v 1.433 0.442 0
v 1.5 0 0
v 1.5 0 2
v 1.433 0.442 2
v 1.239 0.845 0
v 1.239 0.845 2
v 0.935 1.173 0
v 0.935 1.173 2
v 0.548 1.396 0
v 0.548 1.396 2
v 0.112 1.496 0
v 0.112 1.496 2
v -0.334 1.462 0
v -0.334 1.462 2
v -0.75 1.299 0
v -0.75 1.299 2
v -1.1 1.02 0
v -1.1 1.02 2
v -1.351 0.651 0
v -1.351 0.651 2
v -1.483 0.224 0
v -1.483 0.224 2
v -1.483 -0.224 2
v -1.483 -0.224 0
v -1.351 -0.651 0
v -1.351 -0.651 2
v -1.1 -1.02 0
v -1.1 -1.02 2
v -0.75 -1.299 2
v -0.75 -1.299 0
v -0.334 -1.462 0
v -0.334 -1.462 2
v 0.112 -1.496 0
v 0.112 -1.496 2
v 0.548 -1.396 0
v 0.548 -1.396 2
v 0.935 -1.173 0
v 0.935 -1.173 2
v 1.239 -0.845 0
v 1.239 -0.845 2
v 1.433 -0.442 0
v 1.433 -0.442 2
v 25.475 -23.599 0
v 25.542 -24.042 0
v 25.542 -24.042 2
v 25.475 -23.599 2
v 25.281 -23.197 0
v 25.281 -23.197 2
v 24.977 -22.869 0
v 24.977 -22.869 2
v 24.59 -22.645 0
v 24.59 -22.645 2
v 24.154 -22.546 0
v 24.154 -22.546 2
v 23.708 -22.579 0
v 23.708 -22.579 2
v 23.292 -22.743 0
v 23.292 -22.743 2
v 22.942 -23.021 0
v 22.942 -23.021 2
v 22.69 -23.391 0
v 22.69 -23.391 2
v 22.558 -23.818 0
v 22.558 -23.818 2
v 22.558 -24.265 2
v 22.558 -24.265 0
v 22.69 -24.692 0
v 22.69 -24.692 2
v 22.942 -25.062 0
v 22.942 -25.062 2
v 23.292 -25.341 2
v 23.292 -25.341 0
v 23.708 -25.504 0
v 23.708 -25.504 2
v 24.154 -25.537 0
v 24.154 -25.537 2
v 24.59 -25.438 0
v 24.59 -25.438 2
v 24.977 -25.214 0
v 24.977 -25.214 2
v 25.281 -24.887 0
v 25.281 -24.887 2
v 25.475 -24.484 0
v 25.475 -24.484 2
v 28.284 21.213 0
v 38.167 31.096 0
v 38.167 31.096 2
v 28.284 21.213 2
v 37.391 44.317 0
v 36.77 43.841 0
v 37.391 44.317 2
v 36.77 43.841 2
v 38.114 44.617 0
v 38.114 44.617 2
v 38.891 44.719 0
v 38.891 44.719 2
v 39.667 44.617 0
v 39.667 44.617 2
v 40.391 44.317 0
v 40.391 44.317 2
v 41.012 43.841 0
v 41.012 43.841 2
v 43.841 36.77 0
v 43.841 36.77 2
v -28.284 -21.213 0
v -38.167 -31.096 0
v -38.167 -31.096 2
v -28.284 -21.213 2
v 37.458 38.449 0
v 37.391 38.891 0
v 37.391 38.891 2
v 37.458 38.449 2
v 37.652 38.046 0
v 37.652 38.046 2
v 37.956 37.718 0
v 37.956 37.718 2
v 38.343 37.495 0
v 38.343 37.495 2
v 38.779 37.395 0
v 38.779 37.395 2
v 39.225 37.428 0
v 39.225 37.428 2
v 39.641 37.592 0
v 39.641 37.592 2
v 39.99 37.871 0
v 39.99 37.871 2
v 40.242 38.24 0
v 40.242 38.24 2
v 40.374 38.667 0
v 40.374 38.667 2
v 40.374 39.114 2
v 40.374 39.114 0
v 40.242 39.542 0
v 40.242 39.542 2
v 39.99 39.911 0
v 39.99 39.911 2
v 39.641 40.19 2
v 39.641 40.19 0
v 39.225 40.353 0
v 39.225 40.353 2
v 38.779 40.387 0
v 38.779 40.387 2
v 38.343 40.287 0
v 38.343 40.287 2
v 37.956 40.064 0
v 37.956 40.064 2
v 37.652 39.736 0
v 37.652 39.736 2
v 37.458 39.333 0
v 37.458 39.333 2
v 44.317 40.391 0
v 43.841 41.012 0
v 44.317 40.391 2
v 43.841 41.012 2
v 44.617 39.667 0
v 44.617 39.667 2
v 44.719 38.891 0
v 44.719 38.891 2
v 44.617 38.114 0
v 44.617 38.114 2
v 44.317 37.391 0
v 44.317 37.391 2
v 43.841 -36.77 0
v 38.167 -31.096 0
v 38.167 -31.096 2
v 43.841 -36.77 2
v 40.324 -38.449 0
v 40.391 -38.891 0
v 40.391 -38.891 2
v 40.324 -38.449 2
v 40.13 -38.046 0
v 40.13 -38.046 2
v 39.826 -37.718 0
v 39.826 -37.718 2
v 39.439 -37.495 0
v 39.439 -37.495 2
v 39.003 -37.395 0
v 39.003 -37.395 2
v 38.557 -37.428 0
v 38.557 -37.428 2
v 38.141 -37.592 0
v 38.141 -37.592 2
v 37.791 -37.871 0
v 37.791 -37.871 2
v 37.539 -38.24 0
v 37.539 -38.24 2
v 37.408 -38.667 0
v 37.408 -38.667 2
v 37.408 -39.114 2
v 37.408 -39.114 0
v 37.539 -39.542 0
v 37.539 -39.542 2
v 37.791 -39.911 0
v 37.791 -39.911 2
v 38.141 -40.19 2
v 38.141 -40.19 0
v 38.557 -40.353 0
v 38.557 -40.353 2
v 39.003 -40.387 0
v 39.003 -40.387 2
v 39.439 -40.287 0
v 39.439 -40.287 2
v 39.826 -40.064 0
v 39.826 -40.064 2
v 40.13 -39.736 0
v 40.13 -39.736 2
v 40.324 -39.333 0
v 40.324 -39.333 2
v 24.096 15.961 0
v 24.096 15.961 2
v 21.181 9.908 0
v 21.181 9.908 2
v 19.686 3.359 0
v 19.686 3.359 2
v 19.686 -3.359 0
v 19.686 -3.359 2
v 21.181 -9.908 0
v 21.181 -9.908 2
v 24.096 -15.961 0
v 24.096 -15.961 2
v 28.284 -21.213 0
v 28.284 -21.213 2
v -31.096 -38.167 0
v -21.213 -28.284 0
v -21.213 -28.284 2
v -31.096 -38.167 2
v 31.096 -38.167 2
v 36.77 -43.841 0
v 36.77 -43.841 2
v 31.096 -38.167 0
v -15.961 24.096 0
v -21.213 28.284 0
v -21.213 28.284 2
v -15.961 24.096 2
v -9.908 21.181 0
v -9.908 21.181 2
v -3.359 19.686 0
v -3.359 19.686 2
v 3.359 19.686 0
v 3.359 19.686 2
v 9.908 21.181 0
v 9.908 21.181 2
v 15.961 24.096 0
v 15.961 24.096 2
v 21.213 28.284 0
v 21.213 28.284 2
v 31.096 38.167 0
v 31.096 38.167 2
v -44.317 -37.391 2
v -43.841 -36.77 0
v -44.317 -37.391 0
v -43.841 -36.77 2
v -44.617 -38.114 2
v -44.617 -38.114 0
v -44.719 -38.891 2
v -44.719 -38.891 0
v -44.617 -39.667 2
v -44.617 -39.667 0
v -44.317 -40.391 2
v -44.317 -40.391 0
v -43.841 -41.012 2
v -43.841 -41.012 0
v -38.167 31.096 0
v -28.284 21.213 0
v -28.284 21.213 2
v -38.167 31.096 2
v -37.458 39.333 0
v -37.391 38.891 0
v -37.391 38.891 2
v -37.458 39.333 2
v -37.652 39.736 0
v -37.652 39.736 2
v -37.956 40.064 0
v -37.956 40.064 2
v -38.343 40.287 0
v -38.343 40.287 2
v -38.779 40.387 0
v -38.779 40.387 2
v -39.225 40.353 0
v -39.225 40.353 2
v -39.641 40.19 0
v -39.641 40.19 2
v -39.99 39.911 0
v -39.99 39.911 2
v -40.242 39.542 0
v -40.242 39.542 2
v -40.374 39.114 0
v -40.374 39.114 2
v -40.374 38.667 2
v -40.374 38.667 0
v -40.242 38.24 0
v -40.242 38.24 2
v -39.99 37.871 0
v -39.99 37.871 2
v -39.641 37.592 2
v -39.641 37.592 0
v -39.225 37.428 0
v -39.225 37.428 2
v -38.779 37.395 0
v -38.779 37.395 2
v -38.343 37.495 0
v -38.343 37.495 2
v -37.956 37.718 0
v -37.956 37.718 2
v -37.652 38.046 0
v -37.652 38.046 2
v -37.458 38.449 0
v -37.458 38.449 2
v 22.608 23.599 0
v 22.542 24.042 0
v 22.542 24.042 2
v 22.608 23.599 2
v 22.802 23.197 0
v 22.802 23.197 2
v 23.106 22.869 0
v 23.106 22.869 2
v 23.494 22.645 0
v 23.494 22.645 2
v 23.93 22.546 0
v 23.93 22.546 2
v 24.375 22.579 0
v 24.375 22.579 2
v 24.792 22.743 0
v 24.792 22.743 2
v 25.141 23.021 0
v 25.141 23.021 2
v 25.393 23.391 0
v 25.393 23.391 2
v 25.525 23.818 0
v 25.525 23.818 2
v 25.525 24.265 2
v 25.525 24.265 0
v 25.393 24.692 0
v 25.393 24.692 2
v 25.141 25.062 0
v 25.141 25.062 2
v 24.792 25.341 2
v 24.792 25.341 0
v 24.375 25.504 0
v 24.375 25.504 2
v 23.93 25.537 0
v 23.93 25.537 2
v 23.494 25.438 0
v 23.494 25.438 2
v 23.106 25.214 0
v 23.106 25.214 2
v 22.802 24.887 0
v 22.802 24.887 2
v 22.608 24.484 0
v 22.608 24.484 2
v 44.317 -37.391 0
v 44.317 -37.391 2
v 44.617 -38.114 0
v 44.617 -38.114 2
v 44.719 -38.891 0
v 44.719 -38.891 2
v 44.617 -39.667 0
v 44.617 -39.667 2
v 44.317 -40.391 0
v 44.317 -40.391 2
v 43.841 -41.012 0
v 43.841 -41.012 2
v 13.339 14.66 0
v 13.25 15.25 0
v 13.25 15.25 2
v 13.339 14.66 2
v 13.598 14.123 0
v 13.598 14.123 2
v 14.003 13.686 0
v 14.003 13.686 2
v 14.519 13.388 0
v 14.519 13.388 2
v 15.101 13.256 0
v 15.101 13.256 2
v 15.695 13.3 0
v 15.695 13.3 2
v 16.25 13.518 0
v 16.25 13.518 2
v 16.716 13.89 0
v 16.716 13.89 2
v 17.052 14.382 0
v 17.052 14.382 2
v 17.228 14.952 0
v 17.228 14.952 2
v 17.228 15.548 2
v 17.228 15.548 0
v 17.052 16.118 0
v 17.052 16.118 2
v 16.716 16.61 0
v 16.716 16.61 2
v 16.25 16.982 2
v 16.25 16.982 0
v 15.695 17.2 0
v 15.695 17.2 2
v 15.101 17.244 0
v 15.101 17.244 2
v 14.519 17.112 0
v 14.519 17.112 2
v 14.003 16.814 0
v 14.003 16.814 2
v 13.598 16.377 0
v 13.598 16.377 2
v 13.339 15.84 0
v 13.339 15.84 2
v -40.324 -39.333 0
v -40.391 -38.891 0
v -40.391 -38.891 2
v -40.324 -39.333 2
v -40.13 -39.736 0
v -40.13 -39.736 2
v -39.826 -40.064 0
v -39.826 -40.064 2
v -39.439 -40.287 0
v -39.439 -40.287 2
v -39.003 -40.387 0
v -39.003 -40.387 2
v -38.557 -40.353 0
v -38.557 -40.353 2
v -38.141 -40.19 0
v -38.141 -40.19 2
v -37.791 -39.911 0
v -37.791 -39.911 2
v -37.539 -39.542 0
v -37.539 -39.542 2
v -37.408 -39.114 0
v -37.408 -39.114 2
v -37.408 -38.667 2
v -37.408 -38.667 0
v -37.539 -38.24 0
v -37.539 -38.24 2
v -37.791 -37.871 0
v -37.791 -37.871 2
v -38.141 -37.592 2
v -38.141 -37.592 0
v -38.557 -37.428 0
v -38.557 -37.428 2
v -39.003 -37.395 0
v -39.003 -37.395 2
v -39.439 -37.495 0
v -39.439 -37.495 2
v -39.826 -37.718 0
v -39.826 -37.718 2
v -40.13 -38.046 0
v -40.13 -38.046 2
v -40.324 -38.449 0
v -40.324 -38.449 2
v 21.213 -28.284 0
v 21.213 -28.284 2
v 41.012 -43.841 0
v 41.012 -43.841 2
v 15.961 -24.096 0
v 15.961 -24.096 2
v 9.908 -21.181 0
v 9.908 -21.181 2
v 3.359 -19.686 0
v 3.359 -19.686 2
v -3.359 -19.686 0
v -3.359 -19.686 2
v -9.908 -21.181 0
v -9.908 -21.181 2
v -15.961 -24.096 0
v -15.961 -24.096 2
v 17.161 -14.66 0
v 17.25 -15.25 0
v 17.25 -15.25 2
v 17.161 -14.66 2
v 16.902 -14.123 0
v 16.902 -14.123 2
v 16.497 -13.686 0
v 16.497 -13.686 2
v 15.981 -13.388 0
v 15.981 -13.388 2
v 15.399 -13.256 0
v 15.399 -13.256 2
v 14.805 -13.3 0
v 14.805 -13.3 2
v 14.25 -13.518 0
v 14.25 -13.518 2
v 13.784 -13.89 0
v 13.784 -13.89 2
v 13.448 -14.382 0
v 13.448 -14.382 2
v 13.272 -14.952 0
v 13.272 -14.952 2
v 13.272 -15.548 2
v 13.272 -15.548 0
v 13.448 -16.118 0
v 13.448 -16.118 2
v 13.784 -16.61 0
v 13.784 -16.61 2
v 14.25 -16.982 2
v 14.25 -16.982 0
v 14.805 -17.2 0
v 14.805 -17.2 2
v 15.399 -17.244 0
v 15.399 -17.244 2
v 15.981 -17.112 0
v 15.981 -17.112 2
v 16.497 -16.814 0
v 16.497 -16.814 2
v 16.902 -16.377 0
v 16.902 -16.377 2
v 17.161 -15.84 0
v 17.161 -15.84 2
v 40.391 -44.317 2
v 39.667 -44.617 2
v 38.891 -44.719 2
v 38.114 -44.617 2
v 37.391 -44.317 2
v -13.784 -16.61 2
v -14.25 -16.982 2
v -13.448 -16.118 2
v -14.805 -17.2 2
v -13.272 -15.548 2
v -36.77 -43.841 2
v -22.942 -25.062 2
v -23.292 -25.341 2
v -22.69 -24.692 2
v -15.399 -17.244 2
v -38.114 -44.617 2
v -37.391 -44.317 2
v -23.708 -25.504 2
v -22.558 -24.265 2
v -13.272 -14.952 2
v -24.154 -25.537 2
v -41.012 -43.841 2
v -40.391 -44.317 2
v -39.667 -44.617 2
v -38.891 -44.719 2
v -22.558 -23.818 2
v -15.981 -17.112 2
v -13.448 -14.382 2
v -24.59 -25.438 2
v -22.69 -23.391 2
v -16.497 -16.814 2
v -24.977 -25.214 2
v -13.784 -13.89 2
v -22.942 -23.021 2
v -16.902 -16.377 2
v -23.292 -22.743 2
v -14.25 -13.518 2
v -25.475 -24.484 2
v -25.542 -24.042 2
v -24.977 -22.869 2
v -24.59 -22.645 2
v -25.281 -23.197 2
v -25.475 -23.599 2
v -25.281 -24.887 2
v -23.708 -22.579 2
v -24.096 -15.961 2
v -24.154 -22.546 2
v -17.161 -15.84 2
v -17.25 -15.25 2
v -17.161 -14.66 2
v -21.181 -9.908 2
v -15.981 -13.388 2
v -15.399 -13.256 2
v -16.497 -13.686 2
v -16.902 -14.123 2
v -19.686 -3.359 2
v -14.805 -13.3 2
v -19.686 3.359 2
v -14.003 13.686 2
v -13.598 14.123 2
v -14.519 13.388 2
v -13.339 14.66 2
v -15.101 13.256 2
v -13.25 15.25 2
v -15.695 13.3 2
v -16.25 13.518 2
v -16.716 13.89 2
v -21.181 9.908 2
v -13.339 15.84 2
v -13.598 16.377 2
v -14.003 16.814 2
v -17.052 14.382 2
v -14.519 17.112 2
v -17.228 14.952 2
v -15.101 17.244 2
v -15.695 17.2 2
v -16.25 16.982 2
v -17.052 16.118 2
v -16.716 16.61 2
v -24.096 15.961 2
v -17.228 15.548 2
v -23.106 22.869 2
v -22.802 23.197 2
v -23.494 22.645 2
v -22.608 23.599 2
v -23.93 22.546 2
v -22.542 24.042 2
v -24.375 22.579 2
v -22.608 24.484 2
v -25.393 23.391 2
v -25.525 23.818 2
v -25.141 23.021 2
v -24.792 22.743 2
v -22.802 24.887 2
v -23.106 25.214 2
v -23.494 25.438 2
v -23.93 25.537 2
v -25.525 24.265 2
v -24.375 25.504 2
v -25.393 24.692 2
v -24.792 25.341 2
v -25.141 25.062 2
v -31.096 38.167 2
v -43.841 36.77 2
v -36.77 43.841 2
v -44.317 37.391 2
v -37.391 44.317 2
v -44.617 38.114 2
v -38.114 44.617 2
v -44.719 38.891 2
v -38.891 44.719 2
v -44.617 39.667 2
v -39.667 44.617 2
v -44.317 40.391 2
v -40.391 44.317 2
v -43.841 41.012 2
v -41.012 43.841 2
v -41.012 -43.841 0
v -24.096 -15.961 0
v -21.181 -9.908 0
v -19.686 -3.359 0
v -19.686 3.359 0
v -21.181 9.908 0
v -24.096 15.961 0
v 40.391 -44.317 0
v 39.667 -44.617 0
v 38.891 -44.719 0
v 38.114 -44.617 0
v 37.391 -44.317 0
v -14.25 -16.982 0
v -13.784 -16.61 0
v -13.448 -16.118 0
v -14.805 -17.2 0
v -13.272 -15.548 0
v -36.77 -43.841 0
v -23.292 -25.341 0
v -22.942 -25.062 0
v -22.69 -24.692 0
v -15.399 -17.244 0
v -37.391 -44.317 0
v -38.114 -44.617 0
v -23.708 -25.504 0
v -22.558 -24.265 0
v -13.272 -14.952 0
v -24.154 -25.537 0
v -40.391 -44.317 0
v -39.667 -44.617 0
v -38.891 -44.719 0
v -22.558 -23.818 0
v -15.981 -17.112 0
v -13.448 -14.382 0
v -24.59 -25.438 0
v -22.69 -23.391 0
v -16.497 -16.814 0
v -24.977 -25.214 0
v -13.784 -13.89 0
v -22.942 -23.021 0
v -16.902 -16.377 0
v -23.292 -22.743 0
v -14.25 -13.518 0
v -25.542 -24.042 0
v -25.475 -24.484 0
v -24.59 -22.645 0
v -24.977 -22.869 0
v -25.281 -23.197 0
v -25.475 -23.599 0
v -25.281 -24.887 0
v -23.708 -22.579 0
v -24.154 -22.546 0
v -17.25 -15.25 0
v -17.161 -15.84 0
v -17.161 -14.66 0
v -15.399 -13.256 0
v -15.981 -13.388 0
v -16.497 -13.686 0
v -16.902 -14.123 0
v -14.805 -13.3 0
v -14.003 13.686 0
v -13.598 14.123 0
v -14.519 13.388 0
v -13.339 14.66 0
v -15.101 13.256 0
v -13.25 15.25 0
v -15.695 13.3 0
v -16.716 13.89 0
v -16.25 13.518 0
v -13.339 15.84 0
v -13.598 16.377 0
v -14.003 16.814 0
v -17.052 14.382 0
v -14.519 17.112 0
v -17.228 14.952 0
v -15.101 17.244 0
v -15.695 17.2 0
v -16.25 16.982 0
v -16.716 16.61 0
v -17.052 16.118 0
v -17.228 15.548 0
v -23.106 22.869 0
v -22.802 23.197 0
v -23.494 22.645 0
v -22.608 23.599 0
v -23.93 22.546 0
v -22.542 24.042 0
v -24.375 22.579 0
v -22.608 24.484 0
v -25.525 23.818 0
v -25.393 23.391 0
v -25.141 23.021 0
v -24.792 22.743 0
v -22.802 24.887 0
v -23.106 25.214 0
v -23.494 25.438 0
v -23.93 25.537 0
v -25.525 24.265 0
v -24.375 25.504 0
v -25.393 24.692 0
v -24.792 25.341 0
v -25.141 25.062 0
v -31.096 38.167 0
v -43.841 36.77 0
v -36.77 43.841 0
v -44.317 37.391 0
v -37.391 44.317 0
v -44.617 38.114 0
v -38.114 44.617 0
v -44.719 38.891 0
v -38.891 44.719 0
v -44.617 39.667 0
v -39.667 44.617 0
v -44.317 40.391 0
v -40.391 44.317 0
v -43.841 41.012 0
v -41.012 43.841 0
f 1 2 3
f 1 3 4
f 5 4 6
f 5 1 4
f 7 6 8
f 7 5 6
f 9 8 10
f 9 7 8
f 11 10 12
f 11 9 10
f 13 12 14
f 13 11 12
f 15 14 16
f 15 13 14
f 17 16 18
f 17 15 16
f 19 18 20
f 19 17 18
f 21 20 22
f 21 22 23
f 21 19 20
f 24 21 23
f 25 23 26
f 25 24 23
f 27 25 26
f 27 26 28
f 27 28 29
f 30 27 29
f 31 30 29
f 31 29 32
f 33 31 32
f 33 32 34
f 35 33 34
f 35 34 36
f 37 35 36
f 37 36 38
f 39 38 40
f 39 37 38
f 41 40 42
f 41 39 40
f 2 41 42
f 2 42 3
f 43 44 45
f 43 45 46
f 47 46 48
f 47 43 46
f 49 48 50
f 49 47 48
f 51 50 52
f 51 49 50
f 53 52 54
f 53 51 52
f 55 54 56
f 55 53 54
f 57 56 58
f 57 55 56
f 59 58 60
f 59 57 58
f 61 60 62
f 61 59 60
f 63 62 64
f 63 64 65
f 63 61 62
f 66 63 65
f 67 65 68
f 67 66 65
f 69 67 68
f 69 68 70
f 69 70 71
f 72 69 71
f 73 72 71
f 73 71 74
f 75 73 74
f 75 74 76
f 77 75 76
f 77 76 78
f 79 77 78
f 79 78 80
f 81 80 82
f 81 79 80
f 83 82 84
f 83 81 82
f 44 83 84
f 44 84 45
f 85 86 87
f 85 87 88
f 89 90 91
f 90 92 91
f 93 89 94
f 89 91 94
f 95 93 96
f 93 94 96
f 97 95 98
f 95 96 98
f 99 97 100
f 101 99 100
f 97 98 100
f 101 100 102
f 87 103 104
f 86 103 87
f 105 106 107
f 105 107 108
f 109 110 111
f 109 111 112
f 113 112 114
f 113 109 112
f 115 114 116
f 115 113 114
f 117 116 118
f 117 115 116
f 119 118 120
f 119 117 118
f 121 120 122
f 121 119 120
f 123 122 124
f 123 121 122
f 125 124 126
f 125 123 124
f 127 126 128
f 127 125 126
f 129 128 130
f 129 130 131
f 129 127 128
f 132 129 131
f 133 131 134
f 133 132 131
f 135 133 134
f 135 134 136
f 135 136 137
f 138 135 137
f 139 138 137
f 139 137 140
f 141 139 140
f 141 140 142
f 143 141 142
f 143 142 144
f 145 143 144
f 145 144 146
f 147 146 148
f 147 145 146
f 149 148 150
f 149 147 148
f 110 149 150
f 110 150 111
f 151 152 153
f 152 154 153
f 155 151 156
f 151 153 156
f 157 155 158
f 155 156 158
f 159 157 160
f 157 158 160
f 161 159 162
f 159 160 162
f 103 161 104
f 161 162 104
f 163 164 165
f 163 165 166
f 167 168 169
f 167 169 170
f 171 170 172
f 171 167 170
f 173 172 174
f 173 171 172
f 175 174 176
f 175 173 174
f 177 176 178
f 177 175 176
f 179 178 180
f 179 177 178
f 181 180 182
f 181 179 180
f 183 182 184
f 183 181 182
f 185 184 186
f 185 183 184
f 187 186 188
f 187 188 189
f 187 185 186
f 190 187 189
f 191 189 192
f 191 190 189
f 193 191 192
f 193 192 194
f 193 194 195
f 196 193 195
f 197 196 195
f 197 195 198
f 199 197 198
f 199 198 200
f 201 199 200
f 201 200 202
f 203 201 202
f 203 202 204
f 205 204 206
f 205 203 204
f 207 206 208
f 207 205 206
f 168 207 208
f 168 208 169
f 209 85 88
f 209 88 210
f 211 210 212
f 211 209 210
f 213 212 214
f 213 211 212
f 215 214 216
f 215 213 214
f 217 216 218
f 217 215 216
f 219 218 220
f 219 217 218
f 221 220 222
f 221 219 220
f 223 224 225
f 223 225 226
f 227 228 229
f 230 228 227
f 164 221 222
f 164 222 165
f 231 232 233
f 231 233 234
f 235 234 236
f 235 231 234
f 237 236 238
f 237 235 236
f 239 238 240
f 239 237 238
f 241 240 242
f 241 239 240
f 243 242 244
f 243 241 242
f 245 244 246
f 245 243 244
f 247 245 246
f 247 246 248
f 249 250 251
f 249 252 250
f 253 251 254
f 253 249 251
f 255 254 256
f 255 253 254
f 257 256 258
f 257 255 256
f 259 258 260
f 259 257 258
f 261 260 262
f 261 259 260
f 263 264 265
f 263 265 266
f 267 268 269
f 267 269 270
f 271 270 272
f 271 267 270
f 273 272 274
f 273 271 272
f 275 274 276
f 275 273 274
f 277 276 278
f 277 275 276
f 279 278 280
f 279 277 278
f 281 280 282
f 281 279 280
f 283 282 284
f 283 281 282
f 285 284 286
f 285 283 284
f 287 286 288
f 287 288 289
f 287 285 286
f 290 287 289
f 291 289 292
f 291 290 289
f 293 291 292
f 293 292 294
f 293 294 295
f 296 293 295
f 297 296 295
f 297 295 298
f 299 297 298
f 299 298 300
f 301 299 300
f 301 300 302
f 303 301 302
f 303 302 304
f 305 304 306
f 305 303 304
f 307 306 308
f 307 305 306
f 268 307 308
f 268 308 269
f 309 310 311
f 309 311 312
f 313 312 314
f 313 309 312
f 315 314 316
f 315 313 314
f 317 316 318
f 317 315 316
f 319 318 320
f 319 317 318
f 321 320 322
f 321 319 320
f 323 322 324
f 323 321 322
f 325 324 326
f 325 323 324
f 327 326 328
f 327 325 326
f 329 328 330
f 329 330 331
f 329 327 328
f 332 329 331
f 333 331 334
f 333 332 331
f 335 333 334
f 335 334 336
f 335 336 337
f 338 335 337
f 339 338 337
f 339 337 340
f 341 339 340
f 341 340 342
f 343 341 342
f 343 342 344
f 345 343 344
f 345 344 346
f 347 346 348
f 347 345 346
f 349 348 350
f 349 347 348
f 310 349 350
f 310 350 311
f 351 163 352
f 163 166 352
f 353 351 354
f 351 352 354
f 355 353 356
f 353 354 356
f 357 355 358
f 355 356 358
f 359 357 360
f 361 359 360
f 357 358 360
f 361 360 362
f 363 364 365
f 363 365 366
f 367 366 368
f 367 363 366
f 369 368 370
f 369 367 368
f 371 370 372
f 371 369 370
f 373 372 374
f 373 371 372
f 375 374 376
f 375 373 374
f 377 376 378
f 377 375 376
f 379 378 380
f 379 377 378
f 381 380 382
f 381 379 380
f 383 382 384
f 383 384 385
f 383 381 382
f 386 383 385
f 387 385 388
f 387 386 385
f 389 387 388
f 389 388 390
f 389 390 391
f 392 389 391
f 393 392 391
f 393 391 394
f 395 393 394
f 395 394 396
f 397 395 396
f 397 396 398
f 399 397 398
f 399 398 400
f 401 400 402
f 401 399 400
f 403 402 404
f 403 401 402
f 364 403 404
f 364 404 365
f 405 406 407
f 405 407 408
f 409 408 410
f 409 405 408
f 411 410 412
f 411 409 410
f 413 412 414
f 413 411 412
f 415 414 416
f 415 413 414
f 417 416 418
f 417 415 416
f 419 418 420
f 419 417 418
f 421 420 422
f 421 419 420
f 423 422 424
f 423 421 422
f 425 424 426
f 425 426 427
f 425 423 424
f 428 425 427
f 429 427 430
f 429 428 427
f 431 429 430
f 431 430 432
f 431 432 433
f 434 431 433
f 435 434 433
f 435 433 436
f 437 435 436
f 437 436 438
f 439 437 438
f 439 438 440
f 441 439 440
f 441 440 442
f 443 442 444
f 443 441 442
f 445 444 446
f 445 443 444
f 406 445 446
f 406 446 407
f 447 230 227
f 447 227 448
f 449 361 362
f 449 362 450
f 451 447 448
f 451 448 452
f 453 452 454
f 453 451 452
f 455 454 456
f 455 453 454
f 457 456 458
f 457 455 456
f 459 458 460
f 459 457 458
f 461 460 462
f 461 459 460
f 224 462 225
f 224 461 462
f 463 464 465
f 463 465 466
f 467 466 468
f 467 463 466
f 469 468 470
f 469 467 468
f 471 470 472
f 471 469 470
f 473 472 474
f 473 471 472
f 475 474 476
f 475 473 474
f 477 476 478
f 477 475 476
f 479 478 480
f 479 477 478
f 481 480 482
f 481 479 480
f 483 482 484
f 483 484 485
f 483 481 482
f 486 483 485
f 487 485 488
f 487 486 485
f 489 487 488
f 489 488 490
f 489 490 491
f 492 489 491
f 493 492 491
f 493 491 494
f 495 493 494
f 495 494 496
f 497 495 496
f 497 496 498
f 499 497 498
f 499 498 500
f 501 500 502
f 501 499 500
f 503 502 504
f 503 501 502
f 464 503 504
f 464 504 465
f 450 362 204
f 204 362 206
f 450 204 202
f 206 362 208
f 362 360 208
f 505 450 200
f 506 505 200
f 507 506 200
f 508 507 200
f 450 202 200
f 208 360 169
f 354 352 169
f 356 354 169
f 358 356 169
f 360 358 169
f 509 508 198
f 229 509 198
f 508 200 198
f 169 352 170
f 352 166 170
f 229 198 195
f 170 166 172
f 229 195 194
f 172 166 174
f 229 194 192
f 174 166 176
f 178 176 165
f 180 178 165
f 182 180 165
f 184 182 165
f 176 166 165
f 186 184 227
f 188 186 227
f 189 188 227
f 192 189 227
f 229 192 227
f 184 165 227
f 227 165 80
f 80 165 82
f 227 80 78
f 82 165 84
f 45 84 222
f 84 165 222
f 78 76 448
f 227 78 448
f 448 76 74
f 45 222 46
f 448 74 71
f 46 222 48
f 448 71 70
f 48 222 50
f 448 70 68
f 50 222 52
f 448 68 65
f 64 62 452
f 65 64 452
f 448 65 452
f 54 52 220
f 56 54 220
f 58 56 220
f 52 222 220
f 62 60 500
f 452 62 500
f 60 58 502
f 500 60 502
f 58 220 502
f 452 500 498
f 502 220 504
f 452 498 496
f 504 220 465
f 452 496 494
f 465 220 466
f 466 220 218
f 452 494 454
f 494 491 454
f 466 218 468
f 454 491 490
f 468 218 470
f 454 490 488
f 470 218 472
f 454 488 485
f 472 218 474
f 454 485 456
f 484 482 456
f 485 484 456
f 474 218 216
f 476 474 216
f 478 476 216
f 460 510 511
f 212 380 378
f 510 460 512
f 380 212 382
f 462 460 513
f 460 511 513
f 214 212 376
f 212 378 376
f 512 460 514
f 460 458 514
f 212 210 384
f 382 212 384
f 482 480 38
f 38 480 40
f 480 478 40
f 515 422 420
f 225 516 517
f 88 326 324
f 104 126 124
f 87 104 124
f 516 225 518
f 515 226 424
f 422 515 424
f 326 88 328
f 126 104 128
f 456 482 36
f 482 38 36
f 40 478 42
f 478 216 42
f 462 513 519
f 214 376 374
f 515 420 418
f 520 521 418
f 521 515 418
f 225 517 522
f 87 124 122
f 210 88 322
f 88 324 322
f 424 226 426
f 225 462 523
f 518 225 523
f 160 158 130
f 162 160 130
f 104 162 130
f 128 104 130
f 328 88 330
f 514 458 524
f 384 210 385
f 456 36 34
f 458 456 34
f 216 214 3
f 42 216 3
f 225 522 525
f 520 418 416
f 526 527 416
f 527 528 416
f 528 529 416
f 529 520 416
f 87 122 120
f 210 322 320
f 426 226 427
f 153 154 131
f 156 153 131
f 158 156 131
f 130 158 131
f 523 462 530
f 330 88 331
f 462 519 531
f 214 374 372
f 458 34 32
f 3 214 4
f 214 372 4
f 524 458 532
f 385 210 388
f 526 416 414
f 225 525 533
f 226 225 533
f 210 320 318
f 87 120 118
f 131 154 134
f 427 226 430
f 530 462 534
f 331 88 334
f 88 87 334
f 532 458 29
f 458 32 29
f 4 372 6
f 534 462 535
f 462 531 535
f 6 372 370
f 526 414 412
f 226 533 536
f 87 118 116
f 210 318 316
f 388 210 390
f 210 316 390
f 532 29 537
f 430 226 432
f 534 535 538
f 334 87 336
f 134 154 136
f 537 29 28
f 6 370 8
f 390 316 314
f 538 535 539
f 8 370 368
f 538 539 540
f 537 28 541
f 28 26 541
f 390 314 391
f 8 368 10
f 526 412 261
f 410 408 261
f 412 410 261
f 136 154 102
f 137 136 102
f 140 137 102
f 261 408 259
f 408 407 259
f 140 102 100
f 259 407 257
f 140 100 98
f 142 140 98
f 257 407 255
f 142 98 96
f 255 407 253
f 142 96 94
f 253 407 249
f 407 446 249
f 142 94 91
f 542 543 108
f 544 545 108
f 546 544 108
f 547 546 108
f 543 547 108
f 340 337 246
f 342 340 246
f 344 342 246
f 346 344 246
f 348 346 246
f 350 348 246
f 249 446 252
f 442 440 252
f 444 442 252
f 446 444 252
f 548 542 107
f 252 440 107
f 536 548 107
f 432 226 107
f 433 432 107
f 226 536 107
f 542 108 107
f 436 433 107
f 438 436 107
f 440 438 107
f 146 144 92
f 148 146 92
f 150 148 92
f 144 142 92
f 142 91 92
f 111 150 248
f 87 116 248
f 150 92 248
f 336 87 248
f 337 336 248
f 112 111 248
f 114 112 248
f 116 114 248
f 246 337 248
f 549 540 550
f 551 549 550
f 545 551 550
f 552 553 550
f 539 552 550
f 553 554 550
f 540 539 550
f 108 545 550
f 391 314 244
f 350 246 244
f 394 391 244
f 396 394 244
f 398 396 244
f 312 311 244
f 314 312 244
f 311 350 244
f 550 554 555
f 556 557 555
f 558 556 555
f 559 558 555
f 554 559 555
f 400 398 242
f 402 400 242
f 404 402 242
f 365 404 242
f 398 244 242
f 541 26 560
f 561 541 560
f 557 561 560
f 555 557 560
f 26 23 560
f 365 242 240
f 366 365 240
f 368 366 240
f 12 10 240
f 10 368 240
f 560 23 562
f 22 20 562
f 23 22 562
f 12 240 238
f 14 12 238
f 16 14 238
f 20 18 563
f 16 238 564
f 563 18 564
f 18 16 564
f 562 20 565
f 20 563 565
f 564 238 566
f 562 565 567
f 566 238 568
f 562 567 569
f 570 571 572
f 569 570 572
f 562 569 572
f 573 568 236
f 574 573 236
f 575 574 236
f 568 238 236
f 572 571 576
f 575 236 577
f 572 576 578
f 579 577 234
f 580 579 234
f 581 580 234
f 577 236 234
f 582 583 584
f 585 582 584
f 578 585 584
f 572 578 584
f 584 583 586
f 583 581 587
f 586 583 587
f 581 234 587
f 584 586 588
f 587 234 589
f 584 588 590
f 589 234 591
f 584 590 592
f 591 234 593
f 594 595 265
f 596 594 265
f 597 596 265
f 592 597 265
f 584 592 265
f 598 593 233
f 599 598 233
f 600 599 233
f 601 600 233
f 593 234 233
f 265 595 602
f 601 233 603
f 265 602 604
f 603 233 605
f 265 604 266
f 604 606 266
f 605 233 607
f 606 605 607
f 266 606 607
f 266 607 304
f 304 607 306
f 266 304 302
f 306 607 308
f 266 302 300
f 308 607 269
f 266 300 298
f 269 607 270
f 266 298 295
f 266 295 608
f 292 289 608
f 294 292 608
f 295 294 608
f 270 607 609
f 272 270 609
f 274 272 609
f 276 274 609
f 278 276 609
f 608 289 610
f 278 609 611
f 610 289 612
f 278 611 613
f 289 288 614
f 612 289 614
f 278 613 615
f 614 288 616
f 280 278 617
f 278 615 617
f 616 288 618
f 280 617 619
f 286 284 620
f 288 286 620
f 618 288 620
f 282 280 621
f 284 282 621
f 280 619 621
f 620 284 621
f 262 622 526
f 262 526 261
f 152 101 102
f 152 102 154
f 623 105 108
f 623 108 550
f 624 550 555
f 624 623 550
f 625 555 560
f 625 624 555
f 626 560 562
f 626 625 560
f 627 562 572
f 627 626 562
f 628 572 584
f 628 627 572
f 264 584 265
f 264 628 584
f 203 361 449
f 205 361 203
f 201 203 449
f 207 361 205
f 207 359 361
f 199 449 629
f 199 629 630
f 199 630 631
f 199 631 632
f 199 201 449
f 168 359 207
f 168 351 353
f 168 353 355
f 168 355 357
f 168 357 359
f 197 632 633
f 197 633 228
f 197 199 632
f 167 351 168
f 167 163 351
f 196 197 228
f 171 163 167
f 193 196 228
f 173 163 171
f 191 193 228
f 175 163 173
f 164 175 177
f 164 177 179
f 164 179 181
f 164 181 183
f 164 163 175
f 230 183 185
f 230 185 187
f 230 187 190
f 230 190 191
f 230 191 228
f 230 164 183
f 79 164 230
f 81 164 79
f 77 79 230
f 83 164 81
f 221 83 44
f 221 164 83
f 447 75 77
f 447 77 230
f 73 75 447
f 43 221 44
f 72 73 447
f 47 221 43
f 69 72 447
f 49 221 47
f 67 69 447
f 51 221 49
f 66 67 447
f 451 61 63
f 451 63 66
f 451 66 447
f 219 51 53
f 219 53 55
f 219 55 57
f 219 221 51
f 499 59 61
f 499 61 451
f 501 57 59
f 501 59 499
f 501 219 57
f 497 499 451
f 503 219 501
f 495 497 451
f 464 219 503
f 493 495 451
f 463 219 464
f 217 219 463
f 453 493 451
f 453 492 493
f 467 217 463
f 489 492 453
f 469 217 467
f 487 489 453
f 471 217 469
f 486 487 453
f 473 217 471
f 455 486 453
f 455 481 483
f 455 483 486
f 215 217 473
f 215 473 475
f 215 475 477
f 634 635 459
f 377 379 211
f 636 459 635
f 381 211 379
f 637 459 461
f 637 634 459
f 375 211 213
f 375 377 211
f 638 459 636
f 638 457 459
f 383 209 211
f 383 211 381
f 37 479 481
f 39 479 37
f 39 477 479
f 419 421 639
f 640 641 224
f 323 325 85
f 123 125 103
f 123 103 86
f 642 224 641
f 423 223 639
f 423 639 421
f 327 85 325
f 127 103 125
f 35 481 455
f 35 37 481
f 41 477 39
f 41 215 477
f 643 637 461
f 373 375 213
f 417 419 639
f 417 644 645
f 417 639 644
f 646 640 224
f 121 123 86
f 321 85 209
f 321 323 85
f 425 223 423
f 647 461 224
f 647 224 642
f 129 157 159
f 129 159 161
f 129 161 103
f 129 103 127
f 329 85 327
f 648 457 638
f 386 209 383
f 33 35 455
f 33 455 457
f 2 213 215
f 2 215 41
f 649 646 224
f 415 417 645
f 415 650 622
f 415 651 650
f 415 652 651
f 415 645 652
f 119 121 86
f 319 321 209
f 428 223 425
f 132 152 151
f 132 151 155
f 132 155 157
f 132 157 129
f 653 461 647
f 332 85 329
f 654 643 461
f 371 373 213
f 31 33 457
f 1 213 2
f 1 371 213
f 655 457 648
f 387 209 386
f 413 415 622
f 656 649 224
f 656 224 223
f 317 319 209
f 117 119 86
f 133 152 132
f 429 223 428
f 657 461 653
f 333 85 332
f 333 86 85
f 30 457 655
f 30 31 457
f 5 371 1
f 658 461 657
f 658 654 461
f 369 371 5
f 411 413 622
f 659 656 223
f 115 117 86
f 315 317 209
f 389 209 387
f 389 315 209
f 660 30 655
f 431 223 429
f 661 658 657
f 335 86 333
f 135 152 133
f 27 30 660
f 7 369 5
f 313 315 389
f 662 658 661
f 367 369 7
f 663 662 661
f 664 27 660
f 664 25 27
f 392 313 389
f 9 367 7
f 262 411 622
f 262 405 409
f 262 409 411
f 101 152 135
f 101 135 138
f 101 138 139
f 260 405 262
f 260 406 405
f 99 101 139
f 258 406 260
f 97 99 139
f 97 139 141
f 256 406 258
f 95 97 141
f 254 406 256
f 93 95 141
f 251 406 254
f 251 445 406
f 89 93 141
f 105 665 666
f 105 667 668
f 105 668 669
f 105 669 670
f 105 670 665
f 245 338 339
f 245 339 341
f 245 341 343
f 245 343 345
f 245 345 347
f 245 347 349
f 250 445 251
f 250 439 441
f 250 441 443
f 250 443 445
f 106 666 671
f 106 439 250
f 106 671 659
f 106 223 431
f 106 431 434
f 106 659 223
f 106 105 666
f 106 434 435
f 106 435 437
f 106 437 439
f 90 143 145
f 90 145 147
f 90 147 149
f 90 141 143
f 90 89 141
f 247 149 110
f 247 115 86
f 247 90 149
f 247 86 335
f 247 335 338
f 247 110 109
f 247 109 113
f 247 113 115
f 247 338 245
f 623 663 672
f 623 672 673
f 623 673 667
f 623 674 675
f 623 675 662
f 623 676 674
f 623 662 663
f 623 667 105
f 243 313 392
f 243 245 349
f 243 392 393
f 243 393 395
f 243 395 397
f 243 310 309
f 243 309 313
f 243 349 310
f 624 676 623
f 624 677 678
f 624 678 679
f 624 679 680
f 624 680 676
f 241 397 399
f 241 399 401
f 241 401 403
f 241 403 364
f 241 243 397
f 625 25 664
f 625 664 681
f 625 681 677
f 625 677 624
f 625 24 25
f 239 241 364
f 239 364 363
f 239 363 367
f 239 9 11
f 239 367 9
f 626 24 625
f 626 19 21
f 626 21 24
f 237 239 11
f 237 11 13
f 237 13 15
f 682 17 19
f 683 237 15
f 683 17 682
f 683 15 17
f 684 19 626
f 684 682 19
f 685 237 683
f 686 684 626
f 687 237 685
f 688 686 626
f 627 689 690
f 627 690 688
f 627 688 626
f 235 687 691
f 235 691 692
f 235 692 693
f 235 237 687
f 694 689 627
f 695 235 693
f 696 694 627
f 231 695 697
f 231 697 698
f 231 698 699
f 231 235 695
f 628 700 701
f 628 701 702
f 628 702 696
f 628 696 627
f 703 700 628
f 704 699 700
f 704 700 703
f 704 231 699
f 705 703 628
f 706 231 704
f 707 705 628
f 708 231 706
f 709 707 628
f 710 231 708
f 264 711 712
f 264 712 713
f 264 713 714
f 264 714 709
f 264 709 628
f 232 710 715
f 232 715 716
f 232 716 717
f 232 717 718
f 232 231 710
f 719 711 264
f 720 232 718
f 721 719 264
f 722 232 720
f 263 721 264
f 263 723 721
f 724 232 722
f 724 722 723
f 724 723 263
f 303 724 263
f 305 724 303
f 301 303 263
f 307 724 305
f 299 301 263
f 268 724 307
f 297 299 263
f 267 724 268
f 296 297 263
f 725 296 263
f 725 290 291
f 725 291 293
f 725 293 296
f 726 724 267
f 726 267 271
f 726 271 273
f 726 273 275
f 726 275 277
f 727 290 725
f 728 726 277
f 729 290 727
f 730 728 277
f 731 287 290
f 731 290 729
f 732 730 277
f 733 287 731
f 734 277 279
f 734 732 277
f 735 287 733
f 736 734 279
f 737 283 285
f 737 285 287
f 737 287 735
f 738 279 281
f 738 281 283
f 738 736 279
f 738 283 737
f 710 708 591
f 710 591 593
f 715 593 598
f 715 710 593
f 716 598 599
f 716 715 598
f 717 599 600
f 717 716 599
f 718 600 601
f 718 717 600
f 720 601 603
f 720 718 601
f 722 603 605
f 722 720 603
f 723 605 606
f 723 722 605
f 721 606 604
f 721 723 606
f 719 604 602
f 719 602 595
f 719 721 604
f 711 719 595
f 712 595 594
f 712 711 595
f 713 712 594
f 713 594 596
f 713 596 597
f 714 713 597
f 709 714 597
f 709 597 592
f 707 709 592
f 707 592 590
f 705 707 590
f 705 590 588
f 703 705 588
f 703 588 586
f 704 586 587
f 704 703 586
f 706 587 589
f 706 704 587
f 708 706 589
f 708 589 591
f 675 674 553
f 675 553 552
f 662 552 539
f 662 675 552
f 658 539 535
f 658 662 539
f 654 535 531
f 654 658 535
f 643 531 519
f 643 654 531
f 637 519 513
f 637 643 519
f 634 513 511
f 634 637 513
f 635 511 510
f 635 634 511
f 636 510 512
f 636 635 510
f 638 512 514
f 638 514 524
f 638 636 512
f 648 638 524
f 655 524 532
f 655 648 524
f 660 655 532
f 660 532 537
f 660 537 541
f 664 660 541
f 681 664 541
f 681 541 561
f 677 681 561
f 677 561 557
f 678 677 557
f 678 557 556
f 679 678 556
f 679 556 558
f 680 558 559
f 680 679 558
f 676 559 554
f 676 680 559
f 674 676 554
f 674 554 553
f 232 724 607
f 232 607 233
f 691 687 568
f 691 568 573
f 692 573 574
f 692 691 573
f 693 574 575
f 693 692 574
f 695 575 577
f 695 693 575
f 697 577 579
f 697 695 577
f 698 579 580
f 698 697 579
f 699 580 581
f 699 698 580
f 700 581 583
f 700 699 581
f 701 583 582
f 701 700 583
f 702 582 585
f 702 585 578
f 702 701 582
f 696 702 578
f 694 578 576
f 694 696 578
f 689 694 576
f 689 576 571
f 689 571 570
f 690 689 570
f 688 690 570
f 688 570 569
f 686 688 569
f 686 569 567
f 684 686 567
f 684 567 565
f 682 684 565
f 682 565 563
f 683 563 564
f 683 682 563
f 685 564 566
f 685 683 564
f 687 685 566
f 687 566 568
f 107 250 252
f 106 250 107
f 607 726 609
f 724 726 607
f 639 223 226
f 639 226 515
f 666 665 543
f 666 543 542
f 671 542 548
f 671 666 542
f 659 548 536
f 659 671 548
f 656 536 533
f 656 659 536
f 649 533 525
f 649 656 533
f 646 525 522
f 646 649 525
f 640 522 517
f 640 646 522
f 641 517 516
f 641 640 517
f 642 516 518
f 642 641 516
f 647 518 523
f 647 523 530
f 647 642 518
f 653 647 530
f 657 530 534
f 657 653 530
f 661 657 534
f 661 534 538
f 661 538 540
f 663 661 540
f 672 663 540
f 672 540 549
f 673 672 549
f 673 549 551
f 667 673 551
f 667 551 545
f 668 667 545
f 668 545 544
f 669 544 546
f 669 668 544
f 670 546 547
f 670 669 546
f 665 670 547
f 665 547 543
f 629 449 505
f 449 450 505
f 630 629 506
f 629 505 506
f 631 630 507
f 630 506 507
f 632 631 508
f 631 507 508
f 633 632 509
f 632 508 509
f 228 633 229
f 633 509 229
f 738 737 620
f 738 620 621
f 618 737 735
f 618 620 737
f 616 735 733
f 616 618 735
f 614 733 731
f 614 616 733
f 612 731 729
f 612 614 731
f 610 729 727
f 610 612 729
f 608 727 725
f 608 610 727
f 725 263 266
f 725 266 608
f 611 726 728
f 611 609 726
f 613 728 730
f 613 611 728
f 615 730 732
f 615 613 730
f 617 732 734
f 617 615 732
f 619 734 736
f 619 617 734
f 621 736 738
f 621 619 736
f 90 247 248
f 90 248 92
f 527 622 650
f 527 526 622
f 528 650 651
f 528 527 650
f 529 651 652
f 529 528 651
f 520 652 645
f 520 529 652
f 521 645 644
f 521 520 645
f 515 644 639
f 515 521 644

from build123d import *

# Parameters (mm, degrees)
CROQUIS1_R              = 2
CROQUIS1_R_2            = 1.5
SALIENTE_EXTRUIR1_DEPTH = 2
REDONDEO3_R             = 3


with BuildPart() as part:
    # Croquis1 → Saliente-Extruir1 (new body)
    with BuildSketch(Plane.XY):
        with BuildLine():
            Line((-31.096194078, 38.16726189), (-21.213203436, 28.284271247))
            ThreePointArc((-21.213203436, 28.284271247), (0, 19.497474683), (21.213203436, 28.284271247))
            Line((21.213203436, 28.284271247), (31.096194078, 38.16726189))
            Line((31.096194078, 38.16726189), (38.890872965, 45.961940777))
            Line((38.890872965, 45.961940777), (42.426406871, 42.426406871))
            Line((42.426406871, 42.426406871), (45.961940777, 38.890872965))
            Line((45.961940777, 38.890872965), (38.16726189, 31.096194078))
            Line((38.16726189, 31.096194078), (28.284271247, 21.213203436))
            ThreePointArc((28.284271247, 21.213203436), (19.497474683, 0), (28.284271247, -21.213203436))
            Line((28.284271247, -21.213203436), (38.16726189, -31.096194078))
            Line((38.16726189, -31.096194078), (45.961940777, -38.890872965))
            Line((45.961940777, -38.890872965), (42.426406871, -42.426406871))
            Line((42.426406871, -42.426406871), (38.890872965, -45.961940777))
            Line((38.890872965, -45.961940777), (31.096194078, -38.16726189))
            Line((31.096194078, -38.16726189), (21.213203436, -28.284271247))
            ThreePointArc((21.213203436, -28.284271247), (0, -19.497474683), (-21.213203436, -28.284271247))
            Line((-21.213203436, -28.284271247), (-31.096194078, -38.16726189))
            Line((-31.096194078, -38.16726189), (-38.890872965, -45.961940777))
            Line((-38.890872965, -45.961940777), (-42.426406871, -42.426406871))
            Line((-42.426406871, -42.426406871), (-45.961940777, -38.890872965))
            Line((-45.961940777, -38.890872965), (-38.16726189, -31.096194078))
            Line((-38.16726189, -31.096194078), (-28.284271247, -21.213203436))
            ThreePointArc((-28.284271247, -21.213203436), (-19.497474683, 0), (-28.284271247, 21.213203436))
            Line((-28.284271247, 21.213203436), (-38.16726189, 31.096194078))
            Line((-38.16726189, 31.096194078), (-45.961940777, 38.890872965))
            Line((-45.961940777, 38.890872965), (-42.426406871, 42.426406871))
            Line((-42.426406871, 42.426406871), (-38.890872965, 45.961940777))
            Line((-38.890872965, 45.961940777), (-31.096194078, 38.16726189))
        make_face()
        with Locations((-15.25, 15.25)):
            Circle(CROQUIS1_R, mode=Mode.SUBTRACT)
        with Locations((-24.04163056, 24.04163056)):
            Circle(CROQUIS1_R_2, mode=Mode.SUBTRACT)
        with Locations((-38.890872965, 38.890872965)):
            Circle(CROQUIS1_R_2, mode=Mode.SUBTRACT)
        with Locations(Location((38.890872965, 38.890872965, 0), (0, 0, 180))):
            Circle(CROQUIS1_R_2, mode=Mode.SUBTRACT)
        with Locations(Location((24.04163056, 24.04163056, 0), (0, 0, 180))):
            Circle(CROQUIS1_R_2, mode=Mode.SUBTRACT)
        with Locations(Location((15.25, 15.25, 0), (0, 0, 180))):
            Circle(CROQUIS1_R, mode=Mode.SUBTRACT)
        with Locations((15.25, -15.25)):
            Circle(CROQUIS1_R, mode=Mode.SUBTRACT)
        with Locations((24.04163056, -24.04163056)):
            Circle(CROQUIS1_R_2, mode=Mode.SUBTRACT)
        with Locations((38.890872965, -38.890872965)):
            Circle(CROQUIS1_R_2, mode=Mode.SUBTRACT)
        with Locations(Location((-15.25, -15.25, 0), (0, 0, 180))):
            Circle(CROQUIS1_R, mode=Mode.SUBTRACT)
        with Locations(Location((-24.04163056, -24.04163056, 0), (0, 0, 180))):
            Circle(CROQUIS1_R_2, mode=Mode.SUBTRACT)
        with Locations(Location((-38.890872965, -38.890872965, 0), (0, 0, 180))):
            Circle(CROQUIS1_R_2, mode=Mode.SUBTRACT)
        Circle(CROQUIS1_R_2, mode=Mode.SUBTRACT)
    extrude(amount=SALIENTE_EXTRUIR1_DEPTH)

    # Redondeo3
    redondeo3_edges = [part.edges().sort_by_distance(p)[0] for p in [
        (-38.890872965, 45.961940777, 1),
        (38.890872965, 45.961940777, 1),
        (45.961940777, 38.890872965, 1),
        (45.961940777, -38.890872965, 1),
        (38.890872965, -45.961940777, 1),
        (-38.890872965, -45.961940777, 1),
        (-45.961940777, -38.890872965, 1),
        (-45.961940777, 38.890872965, 1),
    ]]
    fillet(redondeo3_edges, radius=REDONDEO3_R)


solid = part.part
